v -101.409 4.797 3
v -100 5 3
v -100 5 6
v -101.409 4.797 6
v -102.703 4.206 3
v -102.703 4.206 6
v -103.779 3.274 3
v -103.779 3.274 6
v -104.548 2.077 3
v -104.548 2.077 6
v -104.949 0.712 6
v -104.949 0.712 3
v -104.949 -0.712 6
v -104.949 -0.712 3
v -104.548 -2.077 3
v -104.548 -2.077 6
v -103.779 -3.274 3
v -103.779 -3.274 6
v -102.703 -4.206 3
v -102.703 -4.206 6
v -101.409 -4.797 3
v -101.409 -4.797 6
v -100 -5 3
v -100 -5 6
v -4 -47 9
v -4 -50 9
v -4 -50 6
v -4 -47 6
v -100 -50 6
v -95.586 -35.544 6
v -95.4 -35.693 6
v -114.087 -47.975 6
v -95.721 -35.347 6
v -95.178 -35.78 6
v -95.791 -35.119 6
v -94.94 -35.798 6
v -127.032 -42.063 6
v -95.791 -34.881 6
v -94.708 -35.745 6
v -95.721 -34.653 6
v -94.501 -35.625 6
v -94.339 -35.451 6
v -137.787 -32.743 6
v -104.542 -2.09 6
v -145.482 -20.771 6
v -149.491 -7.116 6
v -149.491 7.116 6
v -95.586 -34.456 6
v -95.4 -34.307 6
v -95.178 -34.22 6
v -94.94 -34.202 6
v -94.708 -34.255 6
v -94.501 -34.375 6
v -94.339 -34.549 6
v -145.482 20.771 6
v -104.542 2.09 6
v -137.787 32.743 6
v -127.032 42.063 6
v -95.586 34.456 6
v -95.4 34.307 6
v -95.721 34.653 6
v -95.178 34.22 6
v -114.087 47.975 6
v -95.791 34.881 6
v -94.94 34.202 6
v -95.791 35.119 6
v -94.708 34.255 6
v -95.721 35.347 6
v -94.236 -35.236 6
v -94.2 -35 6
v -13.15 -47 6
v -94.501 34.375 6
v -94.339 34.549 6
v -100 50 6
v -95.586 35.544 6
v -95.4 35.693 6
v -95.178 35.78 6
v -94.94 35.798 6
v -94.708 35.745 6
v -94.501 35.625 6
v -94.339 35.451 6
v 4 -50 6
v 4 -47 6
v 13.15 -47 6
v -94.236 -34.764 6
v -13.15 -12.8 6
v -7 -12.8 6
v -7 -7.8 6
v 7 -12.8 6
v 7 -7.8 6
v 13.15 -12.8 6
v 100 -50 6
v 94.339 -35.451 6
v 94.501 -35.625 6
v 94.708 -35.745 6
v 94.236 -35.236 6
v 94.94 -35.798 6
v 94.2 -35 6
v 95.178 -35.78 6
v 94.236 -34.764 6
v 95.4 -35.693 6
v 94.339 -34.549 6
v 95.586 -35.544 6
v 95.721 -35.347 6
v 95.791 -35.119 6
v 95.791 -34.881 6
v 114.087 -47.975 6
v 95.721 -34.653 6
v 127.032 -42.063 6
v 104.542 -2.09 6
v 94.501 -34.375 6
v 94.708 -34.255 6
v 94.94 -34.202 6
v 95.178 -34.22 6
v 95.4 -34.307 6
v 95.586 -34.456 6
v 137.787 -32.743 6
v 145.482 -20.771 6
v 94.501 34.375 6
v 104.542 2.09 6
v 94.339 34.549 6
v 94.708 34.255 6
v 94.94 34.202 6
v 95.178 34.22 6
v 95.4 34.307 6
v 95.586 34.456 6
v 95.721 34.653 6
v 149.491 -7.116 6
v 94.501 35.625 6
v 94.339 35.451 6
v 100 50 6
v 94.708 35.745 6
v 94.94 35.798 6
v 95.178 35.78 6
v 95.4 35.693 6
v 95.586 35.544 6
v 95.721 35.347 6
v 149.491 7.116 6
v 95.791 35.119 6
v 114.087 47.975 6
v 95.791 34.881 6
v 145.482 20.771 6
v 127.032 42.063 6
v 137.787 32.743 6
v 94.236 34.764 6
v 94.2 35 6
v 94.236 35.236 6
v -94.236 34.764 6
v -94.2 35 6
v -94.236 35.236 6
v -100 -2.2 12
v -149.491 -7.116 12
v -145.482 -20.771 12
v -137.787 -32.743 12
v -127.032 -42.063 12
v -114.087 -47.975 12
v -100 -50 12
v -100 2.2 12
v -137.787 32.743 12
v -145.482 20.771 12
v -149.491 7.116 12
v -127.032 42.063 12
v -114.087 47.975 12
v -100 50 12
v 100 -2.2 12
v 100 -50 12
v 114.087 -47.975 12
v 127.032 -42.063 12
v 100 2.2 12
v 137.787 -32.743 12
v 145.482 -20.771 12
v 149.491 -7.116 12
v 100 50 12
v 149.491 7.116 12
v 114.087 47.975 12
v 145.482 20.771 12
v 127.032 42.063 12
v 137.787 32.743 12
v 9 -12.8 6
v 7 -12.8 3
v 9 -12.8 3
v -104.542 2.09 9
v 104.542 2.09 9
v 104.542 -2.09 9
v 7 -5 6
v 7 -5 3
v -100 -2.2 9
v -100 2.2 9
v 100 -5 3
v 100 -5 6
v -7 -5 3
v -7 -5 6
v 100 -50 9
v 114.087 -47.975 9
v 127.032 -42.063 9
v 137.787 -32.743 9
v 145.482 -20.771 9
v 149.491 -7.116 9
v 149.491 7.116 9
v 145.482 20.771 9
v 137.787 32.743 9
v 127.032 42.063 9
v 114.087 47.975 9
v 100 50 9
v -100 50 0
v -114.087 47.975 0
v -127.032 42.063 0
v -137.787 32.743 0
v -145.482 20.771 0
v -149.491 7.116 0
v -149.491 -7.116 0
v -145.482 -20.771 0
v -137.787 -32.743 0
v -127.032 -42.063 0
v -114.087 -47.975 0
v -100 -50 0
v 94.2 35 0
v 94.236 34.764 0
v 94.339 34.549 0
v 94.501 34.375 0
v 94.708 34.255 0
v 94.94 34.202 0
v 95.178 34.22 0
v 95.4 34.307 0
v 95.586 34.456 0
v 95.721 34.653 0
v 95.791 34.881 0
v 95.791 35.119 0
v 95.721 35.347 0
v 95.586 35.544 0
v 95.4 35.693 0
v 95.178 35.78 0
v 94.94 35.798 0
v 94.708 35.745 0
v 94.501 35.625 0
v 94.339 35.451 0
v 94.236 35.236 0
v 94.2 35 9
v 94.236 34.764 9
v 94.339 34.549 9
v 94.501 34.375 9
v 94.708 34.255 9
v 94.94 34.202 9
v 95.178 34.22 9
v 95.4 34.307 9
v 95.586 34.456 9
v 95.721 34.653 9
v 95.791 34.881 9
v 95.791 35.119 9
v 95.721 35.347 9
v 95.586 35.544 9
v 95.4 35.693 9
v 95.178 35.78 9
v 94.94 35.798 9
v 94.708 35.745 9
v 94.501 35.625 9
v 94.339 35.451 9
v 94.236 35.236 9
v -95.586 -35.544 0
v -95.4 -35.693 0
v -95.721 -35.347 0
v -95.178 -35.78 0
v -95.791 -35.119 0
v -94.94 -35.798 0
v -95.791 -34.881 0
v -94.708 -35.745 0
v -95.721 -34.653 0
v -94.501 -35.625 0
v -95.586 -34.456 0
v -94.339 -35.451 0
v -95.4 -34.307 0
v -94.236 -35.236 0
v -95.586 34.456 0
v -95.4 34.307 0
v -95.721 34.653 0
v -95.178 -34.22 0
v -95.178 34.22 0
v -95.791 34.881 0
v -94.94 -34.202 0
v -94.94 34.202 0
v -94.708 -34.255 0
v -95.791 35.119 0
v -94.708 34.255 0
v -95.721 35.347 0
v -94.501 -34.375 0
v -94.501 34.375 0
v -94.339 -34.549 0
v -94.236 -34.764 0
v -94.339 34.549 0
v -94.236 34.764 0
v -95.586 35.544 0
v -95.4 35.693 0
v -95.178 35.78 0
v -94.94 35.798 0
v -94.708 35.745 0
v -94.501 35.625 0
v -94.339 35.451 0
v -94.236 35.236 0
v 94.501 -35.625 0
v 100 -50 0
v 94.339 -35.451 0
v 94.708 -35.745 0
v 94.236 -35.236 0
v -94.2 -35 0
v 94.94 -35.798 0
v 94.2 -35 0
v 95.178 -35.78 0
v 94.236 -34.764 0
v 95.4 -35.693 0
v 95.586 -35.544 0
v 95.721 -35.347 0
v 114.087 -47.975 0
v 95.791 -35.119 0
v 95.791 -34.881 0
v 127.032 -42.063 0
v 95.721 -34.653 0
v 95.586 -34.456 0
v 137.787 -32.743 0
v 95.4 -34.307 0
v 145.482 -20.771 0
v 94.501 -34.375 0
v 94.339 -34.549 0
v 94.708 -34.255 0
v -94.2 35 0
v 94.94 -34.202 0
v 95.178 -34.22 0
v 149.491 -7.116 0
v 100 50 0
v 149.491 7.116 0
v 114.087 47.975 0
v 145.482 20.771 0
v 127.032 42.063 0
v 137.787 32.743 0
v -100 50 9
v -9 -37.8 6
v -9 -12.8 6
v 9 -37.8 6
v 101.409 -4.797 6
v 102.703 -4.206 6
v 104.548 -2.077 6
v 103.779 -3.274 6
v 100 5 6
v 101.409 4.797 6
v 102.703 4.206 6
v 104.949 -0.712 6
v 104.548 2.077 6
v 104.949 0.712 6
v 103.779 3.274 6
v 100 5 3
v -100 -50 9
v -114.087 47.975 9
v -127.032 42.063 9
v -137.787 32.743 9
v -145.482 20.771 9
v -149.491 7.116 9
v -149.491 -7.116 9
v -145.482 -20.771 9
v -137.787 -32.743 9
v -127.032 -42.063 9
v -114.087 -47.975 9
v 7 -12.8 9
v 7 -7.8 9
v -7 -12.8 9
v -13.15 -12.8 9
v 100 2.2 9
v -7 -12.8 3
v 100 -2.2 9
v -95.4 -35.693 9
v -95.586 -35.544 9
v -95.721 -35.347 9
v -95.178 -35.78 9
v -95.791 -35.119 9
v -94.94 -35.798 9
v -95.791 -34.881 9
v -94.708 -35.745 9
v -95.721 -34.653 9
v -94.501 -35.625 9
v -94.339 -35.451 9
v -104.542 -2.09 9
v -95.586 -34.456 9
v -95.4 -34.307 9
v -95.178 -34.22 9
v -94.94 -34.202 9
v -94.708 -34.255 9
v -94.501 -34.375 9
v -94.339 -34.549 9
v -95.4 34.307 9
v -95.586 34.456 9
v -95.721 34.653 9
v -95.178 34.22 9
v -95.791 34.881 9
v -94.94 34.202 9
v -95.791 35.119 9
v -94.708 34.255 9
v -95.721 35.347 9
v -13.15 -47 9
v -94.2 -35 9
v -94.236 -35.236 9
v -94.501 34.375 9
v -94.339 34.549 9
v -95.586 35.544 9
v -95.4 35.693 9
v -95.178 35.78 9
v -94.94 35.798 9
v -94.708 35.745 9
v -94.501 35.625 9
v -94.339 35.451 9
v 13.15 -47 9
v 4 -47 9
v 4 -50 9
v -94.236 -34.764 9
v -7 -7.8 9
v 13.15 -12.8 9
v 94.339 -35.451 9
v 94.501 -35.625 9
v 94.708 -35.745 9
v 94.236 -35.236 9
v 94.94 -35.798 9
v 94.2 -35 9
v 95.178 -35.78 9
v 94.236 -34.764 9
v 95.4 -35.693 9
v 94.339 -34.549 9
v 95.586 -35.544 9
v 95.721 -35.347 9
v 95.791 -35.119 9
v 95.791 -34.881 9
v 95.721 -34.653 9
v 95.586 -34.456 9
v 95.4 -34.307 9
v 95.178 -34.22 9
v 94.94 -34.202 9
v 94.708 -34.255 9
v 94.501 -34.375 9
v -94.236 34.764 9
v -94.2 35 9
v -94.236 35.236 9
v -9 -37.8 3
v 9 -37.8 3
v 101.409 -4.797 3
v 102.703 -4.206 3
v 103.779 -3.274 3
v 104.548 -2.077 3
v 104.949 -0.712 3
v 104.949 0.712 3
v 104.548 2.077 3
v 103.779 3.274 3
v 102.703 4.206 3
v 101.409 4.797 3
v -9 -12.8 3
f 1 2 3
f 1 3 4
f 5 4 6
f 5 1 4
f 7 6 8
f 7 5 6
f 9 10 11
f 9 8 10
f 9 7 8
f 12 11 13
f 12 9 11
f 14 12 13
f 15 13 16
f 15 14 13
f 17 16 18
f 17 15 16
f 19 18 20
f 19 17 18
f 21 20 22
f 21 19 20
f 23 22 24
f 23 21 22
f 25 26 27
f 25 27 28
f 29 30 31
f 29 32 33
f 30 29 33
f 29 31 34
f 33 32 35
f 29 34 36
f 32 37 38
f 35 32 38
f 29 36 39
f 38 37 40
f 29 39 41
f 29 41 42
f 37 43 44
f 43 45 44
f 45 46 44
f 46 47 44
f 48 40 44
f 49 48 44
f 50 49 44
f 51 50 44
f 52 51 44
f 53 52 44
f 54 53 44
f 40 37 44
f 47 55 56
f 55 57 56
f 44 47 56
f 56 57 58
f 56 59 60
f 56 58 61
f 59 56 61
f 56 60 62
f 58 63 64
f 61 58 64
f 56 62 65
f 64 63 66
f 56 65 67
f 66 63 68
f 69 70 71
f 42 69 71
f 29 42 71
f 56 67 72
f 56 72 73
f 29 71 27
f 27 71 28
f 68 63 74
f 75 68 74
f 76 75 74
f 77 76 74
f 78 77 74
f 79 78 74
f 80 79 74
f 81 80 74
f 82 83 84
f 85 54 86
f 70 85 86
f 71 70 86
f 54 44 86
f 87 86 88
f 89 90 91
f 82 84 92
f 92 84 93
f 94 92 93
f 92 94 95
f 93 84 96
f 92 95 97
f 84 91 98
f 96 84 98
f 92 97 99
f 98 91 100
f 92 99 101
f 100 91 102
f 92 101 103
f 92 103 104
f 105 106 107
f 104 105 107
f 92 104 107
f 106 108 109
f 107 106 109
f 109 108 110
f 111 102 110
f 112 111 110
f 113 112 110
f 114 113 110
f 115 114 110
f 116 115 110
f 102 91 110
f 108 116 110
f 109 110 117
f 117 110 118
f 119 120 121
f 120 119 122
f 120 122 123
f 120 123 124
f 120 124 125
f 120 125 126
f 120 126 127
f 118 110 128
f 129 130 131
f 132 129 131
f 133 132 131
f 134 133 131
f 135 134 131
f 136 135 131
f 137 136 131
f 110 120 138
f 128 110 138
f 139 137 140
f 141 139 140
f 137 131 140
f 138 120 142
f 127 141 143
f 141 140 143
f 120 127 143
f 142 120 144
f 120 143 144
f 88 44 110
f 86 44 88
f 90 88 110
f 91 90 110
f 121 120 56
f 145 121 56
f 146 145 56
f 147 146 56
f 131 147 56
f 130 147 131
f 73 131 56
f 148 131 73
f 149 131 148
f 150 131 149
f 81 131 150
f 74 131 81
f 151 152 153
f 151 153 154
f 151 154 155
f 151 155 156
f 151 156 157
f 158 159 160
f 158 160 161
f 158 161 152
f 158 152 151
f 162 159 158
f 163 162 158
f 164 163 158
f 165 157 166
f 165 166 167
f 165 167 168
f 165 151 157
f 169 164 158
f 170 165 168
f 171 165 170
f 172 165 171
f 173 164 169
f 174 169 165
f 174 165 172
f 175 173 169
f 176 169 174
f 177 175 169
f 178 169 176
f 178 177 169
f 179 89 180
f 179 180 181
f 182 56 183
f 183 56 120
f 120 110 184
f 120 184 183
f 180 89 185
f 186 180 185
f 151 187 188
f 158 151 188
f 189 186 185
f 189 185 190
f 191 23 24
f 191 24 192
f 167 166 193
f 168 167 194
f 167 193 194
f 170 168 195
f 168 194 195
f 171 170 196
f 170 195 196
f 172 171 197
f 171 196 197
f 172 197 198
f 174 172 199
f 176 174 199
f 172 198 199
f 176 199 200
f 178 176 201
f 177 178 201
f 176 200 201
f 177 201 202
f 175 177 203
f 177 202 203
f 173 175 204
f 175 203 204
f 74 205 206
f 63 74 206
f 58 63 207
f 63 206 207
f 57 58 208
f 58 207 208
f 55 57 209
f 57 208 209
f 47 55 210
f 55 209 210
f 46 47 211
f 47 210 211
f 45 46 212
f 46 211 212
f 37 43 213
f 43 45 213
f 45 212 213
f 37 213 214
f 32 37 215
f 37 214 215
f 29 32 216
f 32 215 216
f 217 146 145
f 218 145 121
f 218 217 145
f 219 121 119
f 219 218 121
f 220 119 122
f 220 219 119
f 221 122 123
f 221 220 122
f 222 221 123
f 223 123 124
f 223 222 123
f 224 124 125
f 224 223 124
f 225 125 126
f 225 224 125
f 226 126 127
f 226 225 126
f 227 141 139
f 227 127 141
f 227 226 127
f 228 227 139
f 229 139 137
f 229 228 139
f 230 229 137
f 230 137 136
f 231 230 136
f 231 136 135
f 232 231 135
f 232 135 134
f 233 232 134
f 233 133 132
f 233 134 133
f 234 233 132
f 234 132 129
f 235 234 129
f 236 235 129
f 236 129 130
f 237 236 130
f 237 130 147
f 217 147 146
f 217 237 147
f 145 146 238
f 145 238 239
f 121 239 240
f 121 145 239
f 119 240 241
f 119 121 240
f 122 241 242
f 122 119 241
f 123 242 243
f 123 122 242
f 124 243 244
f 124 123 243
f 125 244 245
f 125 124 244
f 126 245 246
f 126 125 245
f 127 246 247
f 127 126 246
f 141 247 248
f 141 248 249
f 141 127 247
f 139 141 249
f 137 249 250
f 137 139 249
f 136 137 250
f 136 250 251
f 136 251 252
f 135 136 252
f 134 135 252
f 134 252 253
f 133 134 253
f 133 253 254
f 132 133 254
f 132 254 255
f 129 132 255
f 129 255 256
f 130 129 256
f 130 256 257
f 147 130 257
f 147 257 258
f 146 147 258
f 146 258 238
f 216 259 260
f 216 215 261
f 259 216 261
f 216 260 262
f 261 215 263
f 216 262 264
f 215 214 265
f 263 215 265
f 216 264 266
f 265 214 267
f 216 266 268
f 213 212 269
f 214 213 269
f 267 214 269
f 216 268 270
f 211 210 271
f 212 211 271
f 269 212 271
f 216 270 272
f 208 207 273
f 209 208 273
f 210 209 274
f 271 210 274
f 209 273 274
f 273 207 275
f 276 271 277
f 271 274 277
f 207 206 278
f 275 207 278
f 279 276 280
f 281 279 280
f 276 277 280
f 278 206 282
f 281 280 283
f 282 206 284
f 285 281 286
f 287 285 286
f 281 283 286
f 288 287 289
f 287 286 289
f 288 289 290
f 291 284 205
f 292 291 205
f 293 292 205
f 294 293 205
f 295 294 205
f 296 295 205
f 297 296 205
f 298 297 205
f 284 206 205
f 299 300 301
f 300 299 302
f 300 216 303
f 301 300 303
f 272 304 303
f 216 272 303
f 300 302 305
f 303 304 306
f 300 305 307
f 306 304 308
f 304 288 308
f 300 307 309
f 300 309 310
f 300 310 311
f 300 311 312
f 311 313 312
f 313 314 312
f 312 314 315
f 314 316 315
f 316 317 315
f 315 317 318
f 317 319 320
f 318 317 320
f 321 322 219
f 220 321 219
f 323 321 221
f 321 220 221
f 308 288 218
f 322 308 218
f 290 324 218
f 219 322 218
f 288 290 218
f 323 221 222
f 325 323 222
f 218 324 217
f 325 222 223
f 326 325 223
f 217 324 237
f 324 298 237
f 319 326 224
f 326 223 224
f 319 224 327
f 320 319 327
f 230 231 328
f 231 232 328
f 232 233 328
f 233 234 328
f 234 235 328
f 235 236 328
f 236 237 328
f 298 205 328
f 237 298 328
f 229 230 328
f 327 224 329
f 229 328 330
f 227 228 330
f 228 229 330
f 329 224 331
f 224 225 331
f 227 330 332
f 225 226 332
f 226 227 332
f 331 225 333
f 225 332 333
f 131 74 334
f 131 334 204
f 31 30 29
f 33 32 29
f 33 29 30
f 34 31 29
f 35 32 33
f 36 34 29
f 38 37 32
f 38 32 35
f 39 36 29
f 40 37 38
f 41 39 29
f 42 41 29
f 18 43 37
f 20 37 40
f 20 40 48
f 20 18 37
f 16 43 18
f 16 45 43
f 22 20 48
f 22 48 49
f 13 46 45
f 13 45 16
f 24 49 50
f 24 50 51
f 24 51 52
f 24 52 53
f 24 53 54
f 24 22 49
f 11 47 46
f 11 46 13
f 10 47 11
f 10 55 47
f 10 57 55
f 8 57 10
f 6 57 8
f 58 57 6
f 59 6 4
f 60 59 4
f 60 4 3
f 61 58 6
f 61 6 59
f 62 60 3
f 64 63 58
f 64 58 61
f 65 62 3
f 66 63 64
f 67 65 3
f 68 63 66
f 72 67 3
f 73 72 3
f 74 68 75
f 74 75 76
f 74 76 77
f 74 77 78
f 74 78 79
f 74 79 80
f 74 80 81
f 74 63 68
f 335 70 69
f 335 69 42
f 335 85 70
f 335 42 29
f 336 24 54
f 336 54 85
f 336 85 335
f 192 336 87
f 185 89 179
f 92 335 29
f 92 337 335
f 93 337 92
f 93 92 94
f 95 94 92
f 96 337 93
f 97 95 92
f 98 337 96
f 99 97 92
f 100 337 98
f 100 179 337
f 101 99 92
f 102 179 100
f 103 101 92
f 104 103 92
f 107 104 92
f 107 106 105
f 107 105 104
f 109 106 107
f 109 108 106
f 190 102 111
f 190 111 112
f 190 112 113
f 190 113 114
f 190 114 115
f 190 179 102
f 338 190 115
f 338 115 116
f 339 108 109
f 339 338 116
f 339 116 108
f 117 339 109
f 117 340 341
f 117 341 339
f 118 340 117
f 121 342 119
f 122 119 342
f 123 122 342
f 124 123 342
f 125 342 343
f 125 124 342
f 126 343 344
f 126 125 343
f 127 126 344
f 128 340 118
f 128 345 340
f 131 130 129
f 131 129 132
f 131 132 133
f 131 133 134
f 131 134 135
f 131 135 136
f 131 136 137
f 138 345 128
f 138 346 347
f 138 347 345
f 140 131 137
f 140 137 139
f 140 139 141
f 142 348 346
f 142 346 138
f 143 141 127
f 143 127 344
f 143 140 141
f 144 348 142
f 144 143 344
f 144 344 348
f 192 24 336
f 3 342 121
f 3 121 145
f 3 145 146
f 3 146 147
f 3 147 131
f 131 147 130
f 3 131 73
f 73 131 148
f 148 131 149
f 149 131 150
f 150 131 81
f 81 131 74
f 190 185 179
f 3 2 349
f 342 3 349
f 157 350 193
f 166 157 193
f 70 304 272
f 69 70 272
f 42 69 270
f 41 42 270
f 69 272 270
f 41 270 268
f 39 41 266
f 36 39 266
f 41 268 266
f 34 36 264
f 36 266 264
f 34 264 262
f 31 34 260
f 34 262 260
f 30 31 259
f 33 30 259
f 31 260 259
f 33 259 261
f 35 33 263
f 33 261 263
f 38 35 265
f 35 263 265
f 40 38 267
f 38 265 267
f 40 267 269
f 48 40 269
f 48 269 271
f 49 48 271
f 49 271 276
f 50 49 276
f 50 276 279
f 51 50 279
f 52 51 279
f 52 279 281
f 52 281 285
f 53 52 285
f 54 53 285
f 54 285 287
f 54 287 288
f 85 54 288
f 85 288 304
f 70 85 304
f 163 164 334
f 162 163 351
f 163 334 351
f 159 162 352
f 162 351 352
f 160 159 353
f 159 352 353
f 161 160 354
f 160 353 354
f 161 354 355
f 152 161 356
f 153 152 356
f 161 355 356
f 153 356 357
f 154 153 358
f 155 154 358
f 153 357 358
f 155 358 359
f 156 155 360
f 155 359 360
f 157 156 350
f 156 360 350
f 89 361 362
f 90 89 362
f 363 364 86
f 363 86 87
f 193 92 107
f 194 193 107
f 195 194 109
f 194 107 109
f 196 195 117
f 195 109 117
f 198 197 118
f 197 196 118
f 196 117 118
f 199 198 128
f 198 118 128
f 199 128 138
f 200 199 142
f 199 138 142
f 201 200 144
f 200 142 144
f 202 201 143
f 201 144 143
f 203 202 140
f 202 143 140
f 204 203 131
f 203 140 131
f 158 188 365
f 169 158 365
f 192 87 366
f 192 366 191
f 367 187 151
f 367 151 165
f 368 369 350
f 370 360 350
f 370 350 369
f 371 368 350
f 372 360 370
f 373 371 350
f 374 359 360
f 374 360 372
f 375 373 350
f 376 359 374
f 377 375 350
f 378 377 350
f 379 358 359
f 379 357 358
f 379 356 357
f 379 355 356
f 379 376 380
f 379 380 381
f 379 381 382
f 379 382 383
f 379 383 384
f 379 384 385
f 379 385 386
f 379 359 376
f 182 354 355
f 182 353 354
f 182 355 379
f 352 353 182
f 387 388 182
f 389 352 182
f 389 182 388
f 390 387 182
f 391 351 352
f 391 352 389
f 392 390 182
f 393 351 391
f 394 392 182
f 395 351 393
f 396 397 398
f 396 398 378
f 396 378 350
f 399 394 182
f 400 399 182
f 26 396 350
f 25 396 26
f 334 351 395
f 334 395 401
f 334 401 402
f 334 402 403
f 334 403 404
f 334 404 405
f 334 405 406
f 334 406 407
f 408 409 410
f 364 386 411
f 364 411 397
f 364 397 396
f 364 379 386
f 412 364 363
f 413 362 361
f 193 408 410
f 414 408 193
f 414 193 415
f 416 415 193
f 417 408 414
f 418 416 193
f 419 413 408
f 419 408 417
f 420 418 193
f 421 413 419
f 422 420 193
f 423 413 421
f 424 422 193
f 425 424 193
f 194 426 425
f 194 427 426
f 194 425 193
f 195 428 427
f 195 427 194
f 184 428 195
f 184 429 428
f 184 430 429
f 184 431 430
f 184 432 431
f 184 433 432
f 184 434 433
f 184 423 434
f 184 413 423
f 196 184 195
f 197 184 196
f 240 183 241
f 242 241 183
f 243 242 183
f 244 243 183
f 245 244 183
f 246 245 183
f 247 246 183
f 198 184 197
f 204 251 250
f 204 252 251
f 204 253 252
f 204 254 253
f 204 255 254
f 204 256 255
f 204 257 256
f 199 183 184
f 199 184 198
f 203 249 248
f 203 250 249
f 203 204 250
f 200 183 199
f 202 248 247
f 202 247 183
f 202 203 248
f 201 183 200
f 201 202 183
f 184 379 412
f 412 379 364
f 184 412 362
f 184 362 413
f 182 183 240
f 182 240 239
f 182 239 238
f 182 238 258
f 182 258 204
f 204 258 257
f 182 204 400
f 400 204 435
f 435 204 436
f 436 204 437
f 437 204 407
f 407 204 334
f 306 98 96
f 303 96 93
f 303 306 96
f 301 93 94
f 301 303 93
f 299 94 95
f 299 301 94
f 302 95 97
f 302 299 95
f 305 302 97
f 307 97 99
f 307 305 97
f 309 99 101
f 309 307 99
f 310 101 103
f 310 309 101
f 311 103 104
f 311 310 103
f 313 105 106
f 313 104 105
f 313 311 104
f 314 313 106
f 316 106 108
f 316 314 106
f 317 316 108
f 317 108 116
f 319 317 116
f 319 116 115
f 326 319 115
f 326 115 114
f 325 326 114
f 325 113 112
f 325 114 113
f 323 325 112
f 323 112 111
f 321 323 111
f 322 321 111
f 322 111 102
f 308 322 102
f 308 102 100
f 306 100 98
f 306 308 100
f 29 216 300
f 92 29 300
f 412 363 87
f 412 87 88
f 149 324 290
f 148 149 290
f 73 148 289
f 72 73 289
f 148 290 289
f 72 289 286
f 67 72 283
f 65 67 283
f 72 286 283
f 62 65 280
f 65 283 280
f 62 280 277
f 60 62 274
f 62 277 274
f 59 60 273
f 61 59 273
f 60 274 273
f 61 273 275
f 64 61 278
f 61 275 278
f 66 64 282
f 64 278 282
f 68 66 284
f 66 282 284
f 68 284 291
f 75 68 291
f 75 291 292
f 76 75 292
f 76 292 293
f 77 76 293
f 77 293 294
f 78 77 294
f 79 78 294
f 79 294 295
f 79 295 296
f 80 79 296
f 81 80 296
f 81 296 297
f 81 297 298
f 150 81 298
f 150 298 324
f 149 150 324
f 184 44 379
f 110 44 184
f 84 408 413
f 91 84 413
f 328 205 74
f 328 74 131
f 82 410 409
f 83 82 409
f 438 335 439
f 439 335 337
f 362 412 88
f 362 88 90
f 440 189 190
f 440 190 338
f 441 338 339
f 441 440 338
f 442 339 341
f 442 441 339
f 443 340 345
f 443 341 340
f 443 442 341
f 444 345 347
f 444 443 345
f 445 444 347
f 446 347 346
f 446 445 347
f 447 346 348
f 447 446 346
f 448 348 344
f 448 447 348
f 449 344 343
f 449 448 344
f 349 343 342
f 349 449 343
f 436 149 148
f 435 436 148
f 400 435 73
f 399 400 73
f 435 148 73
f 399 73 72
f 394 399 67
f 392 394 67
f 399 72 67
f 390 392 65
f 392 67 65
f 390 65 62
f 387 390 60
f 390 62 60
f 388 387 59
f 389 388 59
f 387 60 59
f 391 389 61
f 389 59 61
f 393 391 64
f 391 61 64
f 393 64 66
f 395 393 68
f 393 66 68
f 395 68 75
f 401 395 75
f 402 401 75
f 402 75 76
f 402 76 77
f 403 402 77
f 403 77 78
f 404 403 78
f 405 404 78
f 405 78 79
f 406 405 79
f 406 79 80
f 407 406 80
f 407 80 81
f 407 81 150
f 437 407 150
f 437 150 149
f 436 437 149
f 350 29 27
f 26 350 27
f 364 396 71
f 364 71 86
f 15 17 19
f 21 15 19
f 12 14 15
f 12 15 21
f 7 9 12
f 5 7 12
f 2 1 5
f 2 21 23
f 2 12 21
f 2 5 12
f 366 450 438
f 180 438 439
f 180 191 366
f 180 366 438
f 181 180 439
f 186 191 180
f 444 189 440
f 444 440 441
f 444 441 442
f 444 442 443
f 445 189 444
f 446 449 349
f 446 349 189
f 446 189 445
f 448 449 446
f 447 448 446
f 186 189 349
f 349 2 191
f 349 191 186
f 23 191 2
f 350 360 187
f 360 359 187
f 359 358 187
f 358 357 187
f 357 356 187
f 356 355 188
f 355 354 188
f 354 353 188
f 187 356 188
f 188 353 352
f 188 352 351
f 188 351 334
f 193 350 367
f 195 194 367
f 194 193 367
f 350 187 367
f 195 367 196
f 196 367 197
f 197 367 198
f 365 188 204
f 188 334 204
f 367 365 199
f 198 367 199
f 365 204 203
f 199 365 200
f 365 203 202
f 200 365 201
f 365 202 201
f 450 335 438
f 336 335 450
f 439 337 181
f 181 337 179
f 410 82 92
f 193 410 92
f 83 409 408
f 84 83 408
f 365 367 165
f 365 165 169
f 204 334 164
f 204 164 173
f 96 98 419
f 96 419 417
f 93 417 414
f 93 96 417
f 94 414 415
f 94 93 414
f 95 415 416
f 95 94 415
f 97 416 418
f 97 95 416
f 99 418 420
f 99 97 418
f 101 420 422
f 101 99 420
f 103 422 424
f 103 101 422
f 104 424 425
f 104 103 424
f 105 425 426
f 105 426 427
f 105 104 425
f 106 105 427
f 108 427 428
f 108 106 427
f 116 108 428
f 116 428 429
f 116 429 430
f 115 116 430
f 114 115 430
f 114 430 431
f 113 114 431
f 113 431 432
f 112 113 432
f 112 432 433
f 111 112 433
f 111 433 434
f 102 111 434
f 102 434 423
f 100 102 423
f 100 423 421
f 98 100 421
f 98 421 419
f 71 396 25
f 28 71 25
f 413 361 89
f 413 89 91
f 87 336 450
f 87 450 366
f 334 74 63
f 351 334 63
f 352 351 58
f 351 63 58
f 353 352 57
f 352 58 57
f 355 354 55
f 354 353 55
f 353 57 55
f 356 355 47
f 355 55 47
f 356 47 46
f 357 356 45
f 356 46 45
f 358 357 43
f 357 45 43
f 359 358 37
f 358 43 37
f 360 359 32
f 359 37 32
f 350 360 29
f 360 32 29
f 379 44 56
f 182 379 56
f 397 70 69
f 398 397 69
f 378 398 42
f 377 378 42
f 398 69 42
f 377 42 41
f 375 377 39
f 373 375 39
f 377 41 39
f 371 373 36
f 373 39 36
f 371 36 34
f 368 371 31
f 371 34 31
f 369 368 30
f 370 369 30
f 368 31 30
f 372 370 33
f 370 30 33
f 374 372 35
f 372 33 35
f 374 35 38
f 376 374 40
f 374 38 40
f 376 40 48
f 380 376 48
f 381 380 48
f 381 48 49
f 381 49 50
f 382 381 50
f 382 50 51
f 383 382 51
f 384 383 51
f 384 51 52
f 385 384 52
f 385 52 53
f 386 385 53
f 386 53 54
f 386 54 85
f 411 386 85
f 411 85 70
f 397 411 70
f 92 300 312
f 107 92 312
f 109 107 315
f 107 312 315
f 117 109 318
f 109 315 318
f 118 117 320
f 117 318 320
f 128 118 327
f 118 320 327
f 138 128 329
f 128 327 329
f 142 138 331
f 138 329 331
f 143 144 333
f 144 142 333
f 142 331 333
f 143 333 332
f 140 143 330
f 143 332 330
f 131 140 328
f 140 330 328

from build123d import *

# Parameters (mm, degrees)
BOX_BOTTOM_HALF_0_W     = 301.98633
BOX_BOTTOM_HALF_0_H     = 102
BOX_BOTTOM_HALF_0_DEPTH = 7
PAD_DEPTH               = 3
PAD001_DEPTH            = 3
SKETCH002_W             = 209.08447
SKETCH002_H             = 4.18
PAD002_DEPTH            = 3
SKETCH003_W             = 26.3
SKETCH003_H             = 34.2
POCKET_DEPTH            = 3
SKETCH004_W             = 18
SKETCH004_H             = 25
POCKET001_DEPTH         = 3
SKETCH005_W             = 14
SKETCH005_H             = 5
POCKET002_DEPTH         = 6
SKETCH006_W             = 14
SKETCH006_H             = 3
POCKET003_DEPTH         = 3
SKETCH007_W             = 8
SKETCH007_H             = 3
POCKET004_DEPTH         = 3
SKETCH008_W             = 200
SKETCH008_H             = 4.4
PAD003_DEPTH            = 3
SKETCH009_R             = 0.8
POCKET005_DEPTH         = 9
BOX_BOTTOM_HALF_1_W     = 301.98633
BOX_BOTTOM_HALF_1_H     = 102
BOX_BOTTOM_HALF_1_DEPTH = 4


with BuildPart() as box_bottom_half_0_body:
    # box_bottom_half_0 → box_bottom_half_0 (new body)
    with BuildSketch(Plane(origin=(-150.993165, -51, -1), x_dir=(1, 0, 0), z_dir=(0, 0, 1))):
        with Locations((150.993165, 51)):
            Rectangle(BOX_BOTTOM_HALF_0_W, BOX_BOTTOM_HALF_0_H)
    extrude(amount=BOX_BOTTOM_HALF_0_DEPTH)


with BuildPart() as body:
    # Sketch → Pad (new body)
    with BuildSketch(Plane.XY):
        with BuildLine():
            ThreePointArc((-100, 50), (-150, 0), (-100, -50))
            Line((-100, -50), (100, -50))
            ThreePointArc((100, -50), (150, 0), (100, 50))
            Line((-100, 50), (100, 50))
        make_face()
    extrude(amount=PAD_DEPTH)

    # Sketch001 (on Face6 of Pad) → Pad001 (join)
    with BuildSketch(Plane.XY.offset(3)):
        with BuildLine():
            ThreePointArc((-100, 50), (-150, 0), (-100, -50))
            Line((-100, -50), (100, -50))
            ThreePointArc((100, -50), (150, 0), (100, 50))
            Line((-100, 50), (100, 50))
        make_face()
        with BuildLine():
            ThreePointArc((-100, 5), (-105, 0), (-100, -5))
            Line((-100, -5), (100, -5))
            ThreePointArc((100, -5), (105, 0), (100, 5))
            Line((-100, 5), (100, 5))
        make_face(mode=Mode.SUBTRACT)
    extrude(amount=PAD001_DEPTH)

    # Sketch002 (on Face9 of Pad001) → Pad002 (join)
    with BuildSketch(Plane.XY.offset(6)):
        with BuildLine():
            ThreePointArc((-100, 50), (-150, 0), (-100, -50))
            Line((-100, -50), (100, -50))
            ThreePointArc((100, -50), (150, 0), (100, 50))
            Line((-100, 50), (100, 50))
        make_face()
        Rectangle(SKETCH002_W, SKETCH002_H, mode=Mode.SUBTRACT)
    extrude(amount=PAD002_DEPTH)

    # Sketch003 (on Face13 of Pad002) → Pocket (cut)
    with BuildSketch(Plane.XY.offset(9)):
        with Locations((0, -29.9)):
            Rectangle(SKETCH003_W, SKETCH003_H)
    extrude(amount=-POCKET_DEPTH, mode=Mode.SUBTRACT)

    # Sketch004 (on Face27 of Pocket) → Pocket001 (cut)
    with BuildSketch(Plane.XY.offset(6)):
        with Locations((0, -25.3)):
            Rectangle(SKETCH004_W, SKETCH004_H)
    extrude(amount=-POCKET001_DEPTH, mode=Mode.SUBTRACT)

    # Sketch005 (on Face13 of Pocket001) → Pocket002 (cut)
    with BuildSketch(Plane.XY.offset(9)):
        with Locations((0, -10.3)):
            Rectangle(SKETCH005_W, SKETCH005_H)
    extrude(amount=-POCKET002_DEPTH, mode=Mode.SUBTRACT)

    # Sketch006 (on Face23 of Pocket002) → Pocket003 (cut)
    with BuildSketch(Plane.XZ.offset(7.8)):
        with Locations((0, 4.5)):
            Rectangle(SKETCH006_W, SKETCH006_H)
    extrude(amount=-POCKET003_DEPTH, mode=Mode.SUBTRACT)

    # Sketch007 (on Face13 of Pocket003) → Pocket004 (cut)
    with BuildSketch(Plane.XY.offset(9)):
        with Locations((0, -48.5)):
            Rectangle(SKETCH007_W, SKETCH007_H)
    extrude(amount=-POCKET004_DEPTH, mode=Mode.SUBTRACT)

    # Sketch008 (on Face15 of Pocket004) → Pad003 (join)
    with BuildSketch(Plane.XY.offset(9)):
        with BuildLine():
            ThreePointArc((-100, 50), (-150, 0), (-100, -50))
            Line((-100, -50), (100, -50))
            ThreePointArc((100, -50), (150, 0), (100, 50))
            Line((-100, 50), (100, 50))
        make_face()
        Rectangle(SKETCH008_W, SKETCH008_H, mode=Mode.SUBTRACT)
    extrude(amount=PAD003_DEPTH)

    # Sketch009 (on Face4 of Pad003) → Pocket005 (cut)
    with BuildSketch(Plane(origin=(0, 0, 0), x_dir=(1, 0, 0), z_dir=(0, 0, -1))):
        with Locations((-95, 35)):
            Circle(SKETCH009_R)
        with Locations((-95, -35)):
            Circle(SKETCH009_R)
    pocket005 = extrude(amount=-POCKET005_DEPTH, mode=Mode.SUBTRACT)

    # Mirrored: Pocket005 across Sketch009 V_Axis
    add(pocket005.mirror(Plane(origin=(0, 0, 0), x_dir=(0, 0, -1), z_dir=(1, 0, 0))), mode=Mode.SUBTRACT)


with BuildPart() as bottom_half_0_body:
    # bottom_half_0 base: copy of Body
    add(body.part)

    # bottom_half_0: intersect box_bottom_half_0 body
    add(box_bottom_half_0_body.part, mode=Mode.INTERSECT)


with BuildPart() as box_bottom_half_1_body:
    # box_bottom_half_1 → box_bottom_half_1 (new body)
    with BuildSketch(Plane(origin=(-150.993165, -51, 5), x_dir=(1, 0, 0), z_dir=(0, 0, 1))):
        with Locations((150.993165, 51)):
            Rectangle(BOX_BOTTOM_HALF_1_W, BOX_BOTTOM_HALF_1_H)
    extrude(amount=BOX_BOTTOM_HALF_1_DEPTH)


with BuildPart() as top_half_0_body:
    # top_half_0 base: copy of Body
    add(body.part)

    # top_half_0: cut box_bottom_half_0 body
    add(box_bottom_half_0_body.part, mode=Mode.SUBTRACT)


with BuildPart() as bottom_half_1_body:
    # bottom_half_1 base: copy of top_half_0 body
    add(top_half_0_body.part)

    # bottom_half_1: intersect box_bottom_half_1 body
    add(box_bottom_half_1_body.part, mode=Mode.INTERSECT)


with BuildPart() as top_half_1_body:
    # top_half_1 base: copy of top_half_0 body
    add(top_half_0_body.part)

    # top_half_1: cut box_bottom_half_1 body
    add(box_bottom_half_1_body.part, mode=Mode.SUBTRACT)


solid = Compound([bottom_half_0_body.part, bottom_half_1_body.part, top_half_1_body.part])
